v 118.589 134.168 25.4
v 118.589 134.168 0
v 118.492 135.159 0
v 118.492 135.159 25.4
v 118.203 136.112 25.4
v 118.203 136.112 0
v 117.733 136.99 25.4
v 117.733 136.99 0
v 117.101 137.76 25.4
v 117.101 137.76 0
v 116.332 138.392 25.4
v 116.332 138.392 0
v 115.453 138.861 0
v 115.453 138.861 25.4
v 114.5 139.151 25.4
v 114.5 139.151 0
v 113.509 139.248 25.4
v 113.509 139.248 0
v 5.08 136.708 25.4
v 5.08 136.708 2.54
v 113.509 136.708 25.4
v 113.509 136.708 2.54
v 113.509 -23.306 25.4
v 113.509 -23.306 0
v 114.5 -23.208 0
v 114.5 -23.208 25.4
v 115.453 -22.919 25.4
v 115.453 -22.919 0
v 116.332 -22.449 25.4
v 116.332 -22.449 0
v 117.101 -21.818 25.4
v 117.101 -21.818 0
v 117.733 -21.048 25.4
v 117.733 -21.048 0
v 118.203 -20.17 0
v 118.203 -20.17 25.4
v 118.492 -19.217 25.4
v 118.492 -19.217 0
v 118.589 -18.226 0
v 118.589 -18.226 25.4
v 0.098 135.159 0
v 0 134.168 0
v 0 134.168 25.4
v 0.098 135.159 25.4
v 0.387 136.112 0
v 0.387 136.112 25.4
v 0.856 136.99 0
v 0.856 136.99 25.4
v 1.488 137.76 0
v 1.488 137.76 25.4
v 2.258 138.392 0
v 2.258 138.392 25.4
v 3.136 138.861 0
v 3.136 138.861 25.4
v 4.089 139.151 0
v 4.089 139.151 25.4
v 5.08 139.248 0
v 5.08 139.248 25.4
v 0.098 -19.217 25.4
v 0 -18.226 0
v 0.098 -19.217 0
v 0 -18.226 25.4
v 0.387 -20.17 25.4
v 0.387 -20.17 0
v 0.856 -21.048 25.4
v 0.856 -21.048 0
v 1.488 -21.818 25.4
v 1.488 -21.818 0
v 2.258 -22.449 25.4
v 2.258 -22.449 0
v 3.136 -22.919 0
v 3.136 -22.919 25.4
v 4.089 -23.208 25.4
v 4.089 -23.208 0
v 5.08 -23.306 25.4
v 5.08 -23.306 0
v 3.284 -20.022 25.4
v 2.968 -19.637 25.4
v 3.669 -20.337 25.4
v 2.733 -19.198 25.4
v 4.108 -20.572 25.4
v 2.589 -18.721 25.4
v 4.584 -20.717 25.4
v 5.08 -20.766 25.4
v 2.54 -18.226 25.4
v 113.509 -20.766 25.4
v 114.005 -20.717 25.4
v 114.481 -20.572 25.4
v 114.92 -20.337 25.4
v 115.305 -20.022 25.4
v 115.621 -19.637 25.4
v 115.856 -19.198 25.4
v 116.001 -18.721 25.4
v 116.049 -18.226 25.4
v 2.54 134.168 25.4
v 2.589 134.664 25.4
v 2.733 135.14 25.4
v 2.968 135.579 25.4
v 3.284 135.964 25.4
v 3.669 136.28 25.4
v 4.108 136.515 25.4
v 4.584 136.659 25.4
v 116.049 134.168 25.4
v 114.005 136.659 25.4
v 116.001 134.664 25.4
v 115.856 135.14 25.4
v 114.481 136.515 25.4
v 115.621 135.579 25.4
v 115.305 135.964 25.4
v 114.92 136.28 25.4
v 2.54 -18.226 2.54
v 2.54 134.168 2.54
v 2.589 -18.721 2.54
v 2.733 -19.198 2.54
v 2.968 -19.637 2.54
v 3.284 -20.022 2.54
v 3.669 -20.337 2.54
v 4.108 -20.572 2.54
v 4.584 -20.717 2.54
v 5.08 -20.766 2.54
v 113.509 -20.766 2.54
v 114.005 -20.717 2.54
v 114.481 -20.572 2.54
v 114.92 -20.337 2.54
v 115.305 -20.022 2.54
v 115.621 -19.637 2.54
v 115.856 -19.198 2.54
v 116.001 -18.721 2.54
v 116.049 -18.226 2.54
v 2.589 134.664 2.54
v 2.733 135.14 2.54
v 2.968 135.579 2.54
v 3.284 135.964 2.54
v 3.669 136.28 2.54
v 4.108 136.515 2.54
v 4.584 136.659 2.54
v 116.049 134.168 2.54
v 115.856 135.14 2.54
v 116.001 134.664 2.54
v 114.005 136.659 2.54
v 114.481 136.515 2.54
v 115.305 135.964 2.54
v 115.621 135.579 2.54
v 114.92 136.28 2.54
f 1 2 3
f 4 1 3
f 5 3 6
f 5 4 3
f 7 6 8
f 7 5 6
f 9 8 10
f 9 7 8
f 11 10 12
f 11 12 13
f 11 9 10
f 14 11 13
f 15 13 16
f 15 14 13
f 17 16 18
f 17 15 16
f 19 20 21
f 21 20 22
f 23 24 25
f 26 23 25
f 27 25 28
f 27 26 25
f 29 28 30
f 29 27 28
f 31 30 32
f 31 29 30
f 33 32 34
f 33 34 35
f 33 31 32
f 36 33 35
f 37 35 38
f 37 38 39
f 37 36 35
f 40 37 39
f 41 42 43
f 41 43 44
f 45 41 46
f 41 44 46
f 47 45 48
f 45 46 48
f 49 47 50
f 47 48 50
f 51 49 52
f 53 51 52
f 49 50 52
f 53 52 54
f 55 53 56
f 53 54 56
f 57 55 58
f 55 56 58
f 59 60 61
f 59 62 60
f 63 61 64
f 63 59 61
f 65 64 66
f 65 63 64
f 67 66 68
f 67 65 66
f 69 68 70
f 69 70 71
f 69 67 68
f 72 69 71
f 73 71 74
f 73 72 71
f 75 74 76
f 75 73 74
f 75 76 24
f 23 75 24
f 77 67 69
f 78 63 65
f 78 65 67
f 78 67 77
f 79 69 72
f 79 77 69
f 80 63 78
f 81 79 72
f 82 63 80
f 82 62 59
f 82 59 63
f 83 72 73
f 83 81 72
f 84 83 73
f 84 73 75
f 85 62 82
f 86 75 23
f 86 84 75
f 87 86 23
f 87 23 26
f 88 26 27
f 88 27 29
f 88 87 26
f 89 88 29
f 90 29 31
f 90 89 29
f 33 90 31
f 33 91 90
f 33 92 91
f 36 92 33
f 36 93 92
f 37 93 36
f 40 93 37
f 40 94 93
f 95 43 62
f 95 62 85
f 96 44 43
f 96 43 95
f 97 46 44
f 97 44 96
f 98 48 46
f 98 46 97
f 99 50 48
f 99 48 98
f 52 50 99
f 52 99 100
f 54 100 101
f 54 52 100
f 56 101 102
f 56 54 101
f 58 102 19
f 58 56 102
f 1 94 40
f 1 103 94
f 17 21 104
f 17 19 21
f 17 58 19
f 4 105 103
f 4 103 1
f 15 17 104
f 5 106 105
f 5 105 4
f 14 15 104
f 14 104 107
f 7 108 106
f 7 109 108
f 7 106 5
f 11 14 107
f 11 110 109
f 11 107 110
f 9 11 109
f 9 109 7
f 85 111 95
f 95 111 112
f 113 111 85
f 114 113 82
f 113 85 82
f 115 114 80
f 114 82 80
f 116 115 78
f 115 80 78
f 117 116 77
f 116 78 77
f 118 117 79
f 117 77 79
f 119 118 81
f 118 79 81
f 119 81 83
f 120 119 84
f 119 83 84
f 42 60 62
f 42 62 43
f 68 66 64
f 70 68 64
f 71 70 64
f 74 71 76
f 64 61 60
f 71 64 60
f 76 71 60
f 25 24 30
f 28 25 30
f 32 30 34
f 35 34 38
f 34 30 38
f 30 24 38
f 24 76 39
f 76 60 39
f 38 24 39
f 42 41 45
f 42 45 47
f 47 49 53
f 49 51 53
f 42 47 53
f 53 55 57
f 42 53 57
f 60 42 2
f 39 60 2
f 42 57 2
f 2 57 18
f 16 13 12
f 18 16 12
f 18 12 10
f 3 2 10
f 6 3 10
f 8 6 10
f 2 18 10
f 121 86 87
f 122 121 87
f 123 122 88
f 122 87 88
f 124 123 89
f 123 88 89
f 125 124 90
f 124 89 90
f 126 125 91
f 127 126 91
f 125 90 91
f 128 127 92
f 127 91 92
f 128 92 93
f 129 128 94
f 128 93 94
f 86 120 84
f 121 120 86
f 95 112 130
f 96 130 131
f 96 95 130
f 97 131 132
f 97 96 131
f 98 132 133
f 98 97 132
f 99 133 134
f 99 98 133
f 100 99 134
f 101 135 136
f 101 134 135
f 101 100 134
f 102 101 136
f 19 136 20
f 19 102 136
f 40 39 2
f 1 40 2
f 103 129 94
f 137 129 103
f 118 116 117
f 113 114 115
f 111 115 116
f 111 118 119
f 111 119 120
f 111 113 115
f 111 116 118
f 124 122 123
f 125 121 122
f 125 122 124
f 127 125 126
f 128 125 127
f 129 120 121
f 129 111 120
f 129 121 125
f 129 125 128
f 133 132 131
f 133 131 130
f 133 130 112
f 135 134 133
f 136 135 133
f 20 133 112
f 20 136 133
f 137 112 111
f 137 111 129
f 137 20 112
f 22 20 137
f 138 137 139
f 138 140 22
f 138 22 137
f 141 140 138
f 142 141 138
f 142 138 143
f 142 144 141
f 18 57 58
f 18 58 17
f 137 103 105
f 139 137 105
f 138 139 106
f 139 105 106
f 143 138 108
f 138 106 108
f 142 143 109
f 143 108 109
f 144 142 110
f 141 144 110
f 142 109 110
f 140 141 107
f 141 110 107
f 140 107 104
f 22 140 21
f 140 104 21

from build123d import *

# Parameters (mm, degrees)
F0_W     = 118.589319
F0_H     = 162.553676
F1_DEPTH = 25.4
F2_R     = 5.08
F3_T     = -2.54


with BuildPart() as f1:
    # F0 (on Top) → F1 (new body)
    with BuildSketch(Plane.XY):
        with Locations((59.294659, 57.971325)):
            Rectangle(F0_W, F0_H)
    extrude(amount=F1_DEPTH)

    # F2
    f2_edges = [f1.edges().sort_by_distance(p)[0] for p in [
        (118.589319, -23.305513, 12.7),
        (118.589319, 139.248163, 12.7),
        (0, 139.248163, 12.7),
        (0, -23.305513, 12.7),
    ]]
    fillet(f2_edges, radius=F2_R)

    # F3
    f3_openings = [f1.faces().sort_by_distance(p)[0] for p in [
        (59.29466, 57.971325, 25.4),
    ]]
    offset(amount=F3_T, openings=f3_openings)


solid = f1.part
